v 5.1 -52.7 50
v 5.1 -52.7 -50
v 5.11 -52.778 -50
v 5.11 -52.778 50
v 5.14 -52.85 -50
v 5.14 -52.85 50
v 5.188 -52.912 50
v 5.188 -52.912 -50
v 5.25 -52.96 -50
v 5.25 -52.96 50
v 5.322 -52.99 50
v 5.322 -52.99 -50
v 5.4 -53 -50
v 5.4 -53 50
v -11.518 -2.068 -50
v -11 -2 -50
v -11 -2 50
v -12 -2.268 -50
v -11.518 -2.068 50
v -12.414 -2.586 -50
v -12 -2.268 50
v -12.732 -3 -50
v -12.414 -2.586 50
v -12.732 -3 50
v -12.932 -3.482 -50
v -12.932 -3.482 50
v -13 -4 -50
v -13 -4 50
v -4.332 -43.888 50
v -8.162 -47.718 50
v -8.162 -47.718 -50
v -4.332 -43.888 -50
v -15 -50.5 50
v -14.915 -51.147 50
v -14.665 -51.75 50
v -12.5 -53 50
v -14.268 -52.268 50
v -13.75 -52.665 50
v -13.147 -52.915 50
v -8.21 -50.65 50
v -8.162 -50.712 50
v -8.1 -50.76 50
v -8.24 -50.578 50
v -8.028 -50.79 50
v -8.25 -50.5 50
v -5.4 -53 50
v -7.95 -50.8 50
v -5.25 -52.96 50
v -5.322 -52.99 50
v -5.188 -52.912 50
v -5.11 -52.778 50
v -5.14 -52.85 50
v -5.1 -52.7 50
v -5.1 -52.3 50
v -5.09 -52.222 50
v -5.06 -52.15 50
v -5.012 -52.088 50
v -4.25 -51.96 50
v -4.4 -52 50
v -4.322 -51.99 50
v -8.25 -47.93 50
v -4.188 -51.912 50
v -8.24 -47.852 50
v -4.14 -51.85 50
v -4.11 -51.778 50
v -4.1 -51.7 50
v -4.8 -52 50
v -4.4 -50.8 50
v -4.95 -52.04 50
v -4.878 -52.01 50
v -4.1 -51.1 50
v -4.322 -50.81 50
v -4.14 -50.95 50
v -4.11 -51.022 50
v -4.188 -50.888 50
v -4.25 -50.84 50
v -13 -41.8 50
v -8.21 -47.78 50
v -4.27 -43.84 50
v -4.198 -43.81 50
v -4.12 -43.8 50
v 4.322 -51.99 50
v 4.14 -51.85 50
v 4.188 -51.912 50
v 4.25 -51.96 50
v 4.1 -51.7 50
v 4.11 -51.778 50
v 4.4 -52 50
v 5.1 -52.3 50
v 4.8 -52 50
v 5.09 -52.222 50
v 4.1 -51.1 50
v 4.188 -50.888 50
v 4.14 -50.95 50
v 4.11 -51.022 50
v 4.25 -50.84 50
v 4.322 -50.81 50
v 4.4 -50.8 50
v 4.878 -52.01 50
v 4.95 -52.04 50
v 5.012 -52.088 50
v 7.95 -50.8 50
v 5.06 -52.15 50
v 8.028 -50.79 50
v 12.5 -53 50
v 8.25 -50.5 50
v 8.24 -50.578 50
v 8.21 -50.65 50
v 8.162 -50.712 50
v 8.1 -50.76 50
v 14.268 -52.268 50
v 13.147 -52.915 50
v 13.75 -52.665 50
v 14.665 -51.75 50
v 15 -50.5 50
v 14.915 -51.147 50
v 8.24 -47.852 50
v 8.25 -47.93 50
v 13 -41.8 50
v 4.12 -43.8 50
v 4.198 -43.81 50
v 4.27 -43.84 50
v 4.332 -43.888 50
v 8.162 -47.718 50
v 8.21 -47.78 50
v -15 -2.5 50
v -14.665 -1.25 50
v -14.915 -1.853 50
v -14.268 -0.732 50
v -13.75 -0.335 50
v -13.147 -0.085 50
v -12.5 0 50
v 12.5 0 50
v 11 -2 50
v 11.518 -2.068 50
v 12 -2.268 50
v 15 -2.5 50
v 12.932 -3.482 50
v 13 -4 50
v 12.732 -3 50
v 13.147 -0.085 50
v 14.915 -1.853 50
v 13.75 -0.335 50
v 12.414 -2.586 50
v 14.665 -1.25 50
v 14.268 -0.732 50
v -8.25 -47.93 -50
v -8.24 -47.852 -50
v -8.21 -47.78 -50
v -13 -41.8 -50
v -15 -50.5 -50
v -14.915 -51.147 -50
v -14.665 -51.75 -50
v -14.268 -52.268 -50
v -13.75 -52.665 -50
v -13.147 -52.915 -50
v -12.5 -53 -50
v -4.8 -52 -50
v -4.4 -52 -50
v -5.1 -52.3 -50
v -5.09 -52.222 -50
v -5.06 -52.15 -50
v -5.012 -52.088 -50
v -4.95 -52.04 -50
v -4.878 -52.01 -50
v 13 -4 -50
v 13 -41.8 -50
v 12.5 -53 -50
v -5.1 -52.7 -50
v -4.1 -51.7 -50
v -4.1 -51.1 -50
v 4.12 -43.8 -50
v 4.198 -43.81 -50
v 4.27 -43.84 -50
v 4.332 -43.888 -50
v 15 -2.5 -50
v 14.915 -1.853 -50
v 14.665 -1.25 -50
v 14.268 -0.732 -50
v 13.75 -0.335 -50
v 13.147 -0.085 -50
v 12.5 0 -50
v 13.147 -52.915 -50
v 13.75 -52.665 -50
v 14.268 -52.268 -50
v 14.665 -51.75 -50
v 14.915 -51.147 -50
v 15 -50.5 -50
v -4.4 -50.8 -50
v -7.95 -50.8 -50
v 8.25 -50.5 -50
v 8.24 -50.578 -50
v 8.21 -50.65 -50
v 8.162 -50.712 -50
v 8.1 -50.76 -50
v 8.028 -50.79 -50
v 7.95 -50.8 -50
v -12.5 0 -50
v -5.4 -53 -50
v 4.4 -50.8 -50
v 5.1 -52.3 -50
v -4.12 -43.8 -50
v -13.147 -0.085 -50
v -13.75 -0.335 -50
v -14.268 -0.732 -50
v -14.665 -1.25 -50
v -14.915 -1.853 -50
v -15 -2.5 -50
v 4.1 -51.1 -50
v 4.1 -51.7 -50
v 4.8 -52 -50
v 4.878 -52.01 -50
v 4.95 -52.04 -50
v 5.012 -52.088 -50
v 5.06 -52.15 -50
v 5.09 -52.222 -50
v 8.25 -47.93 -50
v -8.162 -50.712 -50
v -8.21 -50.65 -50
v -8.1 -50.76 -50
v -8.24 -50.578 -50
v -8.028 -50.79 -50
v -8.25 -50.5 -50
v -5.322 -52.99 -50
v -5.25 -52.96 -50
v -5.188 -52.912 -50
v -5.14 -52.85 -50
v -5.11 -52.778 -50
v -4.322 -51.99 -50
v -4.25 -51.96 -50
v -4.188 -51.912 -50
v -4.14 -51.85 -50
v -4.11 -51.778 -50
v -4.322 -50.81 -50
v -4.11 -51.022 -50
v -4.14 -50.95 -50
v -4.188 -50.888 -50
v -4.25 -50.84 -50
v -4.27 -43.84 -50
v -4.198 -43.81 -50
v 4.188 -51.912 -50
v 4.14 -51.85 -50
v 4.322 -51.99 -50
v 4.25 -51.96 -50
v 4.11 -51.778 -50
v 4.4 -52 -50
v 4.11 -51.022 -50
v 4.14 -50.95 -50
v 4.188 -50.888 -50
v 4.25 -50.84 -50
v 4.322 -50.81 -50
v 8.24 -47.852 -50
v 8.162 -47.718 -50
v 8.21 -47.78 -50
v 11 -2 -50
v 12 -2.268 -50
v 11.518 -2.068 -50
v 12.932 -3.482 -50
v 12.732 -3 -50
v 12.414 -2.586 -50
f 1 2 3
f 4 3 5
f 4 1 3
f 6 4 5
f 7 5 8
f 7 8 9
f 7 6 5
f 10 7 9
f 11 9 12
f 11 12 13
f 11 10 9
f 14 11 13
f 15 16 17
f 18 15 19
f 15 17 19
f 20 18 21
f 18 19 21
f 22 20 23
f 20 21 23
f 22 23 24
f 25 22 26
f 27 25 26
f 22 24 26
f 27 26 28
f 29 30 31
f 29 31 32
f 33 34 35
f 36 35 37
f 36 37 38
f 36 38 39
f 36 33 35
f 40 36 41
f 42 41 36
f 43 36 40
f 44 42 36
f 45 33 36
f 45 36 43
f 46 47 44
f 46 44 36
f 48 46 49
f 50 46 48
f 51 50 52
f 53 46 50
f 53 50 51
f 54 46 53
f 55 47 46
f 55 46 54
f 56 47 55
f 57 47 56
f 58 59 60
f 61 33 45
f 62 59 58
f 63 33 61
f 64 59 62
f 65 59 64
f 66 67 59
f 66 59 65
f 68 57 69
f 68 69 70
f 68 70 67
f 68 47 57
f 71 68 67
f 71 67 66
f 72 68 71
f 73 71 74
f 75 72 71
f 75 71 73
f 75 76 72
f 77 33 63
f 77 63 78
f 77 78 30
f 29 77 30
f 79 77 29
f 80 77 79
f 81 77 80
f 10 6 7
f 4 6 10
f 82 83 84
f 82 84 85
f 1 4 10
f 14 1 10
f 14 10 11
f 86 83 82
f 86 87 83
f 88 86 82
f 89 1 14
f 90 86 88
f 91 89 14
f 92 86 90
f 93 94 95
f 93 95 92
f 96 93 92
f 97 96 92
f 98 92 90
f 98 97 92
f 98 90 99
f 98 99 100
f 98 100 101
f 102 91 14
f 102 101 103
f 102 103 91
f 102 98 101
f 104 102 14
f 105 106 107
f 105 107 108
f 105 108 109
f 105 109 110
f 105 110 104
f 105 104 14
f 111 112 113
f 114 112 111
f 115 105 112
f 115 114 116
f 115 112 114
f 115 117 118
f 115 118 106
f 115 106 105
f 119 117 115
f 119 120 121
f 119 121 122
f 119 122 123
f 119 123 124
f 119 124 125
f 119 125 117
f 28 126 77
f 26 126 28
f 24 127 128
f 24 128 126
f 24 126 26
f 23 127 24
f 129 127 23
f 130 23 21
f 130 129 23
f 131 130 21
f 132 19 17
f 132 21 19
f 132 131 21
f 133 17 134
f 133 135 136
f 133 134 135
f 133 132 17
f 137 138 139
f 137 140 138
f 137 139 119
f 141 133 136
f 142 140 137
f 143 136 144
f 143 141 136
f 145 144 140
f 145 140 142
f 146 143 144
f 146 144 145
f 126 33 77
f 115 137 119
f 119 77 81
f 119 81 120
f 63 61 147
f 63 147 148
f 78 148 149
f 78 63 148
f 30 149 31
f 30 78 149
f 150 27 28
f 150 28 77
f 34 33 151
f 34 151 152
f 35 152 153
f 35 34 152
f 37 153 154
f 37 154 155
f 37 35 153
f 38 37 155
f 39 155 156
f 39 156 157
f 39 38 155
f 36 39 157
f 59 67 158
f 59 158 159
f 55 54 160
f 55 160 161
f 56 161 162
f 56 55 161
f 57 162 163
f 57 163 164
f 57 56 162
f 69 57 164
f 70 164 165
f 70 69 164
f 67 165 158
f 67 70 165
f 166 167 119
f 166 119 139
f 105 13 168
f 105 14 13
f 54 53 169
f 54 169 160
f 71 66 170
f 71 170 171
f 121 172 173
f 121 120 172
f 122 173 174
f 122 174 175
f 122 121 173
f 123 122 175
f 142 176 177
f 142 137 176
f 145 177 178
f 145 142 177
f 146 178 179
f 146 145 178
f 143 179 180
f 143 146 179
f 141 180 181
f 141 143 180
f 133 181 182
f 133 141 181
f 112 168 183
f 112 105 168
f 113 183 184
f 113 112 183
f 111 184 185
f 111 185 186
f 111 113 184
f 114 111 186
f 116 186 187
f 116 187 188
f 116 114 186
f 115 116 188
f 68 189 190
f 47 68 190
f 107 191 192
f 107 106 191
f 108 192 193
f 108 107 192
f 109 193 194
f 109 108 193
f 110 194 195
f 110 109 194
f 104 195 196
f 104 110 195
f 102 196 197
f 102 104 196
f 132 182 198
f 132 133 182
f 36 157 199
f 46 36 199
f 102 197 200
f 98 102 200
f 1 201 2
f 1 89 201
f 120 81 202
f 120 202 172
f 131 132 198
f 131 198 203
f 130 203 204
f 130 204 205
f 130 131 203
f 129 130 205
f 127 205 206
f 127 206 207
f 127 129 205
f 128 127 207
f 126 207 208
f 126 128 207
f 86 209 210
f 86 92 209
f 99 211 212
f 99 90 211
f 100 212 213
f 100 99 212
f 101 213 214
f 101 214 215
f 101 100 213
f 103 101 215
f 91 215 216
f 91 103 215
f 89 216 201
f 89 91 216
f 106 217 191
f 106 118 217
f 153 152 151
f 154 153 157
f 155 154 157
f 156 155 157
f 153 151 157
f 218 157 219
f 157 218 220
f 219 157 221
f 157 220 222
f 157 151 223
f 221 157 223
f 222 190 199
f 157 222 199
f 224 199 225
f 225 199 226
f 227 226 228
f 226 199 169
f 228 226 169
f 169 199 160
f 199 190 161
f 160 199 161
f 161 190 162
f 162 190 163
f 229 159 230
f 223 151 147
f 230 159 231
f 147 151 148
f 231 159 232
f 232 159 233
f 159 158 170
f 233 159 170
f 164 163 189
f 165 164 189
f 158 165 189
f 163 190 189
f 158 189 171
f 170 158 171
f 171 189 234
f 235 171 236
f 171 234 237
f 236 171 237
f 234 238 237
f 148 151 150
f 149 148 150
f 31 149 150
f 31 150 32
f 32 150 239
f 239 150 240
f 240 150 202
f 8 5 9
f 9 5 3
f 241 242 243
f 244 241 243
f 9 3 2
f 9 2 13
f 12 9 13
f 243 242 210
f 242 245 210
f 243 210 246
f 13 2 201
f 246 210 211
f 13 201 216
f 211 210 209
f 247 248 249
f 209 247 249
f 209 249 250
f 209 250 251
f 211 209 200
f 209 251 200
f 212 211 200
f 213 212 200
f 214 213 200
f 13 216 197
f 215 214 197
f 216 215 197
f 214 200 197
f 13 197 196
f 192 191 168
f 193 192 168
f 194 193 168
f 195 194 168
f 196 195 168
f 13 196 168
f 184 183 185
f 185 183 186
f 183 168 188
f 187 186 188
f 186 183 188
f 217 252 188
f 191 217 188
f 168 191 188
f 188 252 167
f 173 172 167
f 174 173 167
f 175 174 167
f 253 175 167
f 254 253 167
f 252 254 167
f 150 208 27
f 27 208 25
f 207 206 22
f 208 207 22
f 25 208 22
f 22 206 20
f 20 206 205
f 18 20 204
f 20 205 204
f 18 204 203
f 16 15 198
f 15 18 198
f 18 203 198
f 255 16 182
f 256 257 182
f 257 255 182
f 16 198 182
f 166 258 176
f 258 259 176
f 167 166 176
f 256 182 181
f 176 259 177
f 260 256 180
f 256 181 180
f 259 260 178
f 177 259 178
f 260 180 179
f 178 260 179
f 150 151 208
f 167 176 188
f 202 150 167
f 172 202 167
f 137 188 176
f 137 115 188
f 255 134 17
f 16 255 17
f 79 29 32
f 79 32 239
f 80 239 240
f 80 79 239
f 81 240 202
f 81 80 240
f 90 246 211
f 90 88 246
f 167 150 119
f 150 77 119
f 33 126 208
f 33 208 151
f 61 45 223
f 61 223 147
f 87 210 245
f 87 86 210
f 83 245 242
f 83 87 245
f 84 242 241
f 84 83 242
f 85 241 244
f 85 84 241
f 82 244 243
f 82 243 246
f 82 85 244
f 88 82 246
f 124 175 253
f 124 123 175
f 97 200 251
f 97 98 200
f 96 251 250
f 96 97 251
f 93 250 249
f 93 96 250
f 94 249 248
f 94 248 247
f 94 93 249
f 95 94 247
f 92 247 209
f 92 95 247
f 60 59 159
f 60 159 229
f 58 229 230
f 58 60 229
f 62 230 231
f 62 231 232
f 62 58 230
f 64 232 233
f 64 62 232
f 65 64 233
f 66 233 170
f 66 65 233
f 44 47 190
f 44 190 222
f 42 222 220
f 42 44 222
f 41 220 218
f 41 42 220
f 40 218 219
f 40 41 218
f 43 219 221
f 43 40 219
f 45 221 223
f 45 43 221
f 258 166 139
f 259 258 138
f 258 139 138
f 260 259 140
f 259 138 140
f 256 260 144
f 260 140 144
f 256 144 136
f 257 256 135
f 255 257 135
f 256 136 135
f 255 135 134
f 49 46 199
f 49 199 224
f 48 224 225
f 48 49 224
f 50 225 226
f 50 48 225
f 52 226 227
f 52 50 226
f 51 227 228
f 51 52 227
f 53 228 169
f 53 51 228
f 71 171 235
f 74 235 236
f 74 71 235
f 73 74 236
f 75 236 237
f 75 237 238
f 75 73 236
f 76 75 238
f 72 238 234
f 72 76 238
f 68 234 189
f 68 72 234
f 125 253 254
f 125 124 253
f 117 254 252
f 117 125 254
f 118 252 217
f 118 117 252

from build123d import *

# Parameters (mm, degrees)
EXTRUDE_1_DEPTH = 50


with BuildPart() as part:
    # 草图1 → 凸台-拉伸1 (new, symmetric)
    with BuildSketch(Plane.XY):
        with BuildLine():
            Line((12.49999999, 0), (-12.49999999, 0))
            ThreePointArc((-12.49999999, 0), (-14.267766942, -0.732233047), (-14.999999989, -2.499999998))
            Line((-14.999999989, -2.499999998), (-14.999999989, -50.500000002))
            ThreePointArc((-14.999999989, -50.500000002), (-14.267766942, -52.267766953), (-12.49999999, -53))
            Line((-12.49999999, -53), (-5.399999995, -53))
            ThreePointArc((-5.399999995, -53), (-5.187867961, -52.912132034), (-5.099999996, -52.7))
            Line((-5.099999996, -52.7), (-5.099999996, -52.300000001))
            ThreePointArc((-5.099999996, -52.300000001), (-5.01213203, -52.087867966), (-4.799999996, -52.000000001))
            Line((-4.799999996, -52.000000001), (-4.399999997, -52.000000001))
            ThreePointArc((-4.399999997, -52.000000001), (-4.187867962, -51.912132035), (-4.099999997, -51.700000001))
            Line((-4.099999997, -51.700000001), (-4.099999997, -51.100000001))
            ThreePointArc((-4.099999997, -51.100000001), (-4.187867962, -50.887867967), (-4.399999997, -50.800000002))
            Line((-4.399999997, -50.800000002), (-7.949999994, -50.800000002))
            ThreePointArc((-7.949999994, -50.800000002), (-8.162132028, -50.712132036), (-8.249999994, -50.500000002))
            Line((-8.249999994, -50.500000002), (-8.249999994, -47.929898991))
            ThreePointArc((-8.249999994, -47.929898991), (-8.227163853, -47.815093962), (-8.162132028, -47.717766957))
            Line((-8.162132028, -47.717766957), (-4.332233044, -43.887867973))
            ThreePointArc((-4.332233044, -43.887867973), (-4.234906039, -43.822836147), (-4.12010101, -43.800000007))
            Line((-4.12010101, -43.800000007), (4.12010101, -43.800000007))
            ThreePointArc((4.12010101, -43.800000007), (4.234906039, -43.822836147), (4.332233044, -43.887867973))
            Line((4.332233044, -43.887867973), (8.162132028, -47.717766957))
            ThreePointArc((8.162132028, -47.717766957), (8.227163854, -47.815093961), (8.249999994, -47.929898991))
            Line((8.249999994, -47.929898991), (8.249999994, -50.500000002))
            ThreePointArc((8.249999994, -50.500000002), (8.162132028, -50.712132036), (7.949999994, -50.800000002))
            Line((7.949999994, -50.800000002), (4.399999997, -50.800000002))
            ThreePointArc((4.399999997, -50.800000002), (4.187867963, -50.887867967), (4.099999997, -51.100000001))
            Line((4.099999997, -51.100000001), (4.099999997, -51.700000001))
            ThreePointArc((4.099999997, -51.700000001), (4.187867963, -51.912132035), (4.399999997, -52.000000001))
            Line((4.399999997, -52.000000001), (4.799999996, -52.000000001))
            ThreePointArc((4.799999996, -52.000000001), (5.01213203, -52.087867966), (5.099999996, -52.300000001))
            Line((5.099999996, -52.300000001), (5.099999996, -52.7))
            ThreePointArc((5.099999996, -52.7), (5.187867962, -52.912132034), (5.399999996, -53))
            Line((5.399999996, -53), (12.49999999, -53))
            ThreePointArc((12.49999999, -53), (14.267766942, -52.267766953), (14.999999989, -50.500000002))
            Line((14.999999989, -50.500000002), (14.999999989, -2.499999998))
            ThreePointArc((14.999999989, -2.499999998), (14.267766942, -0.732233047), (12.49999999, 0))
        make_face()
        with BuildLine():
            Line((10.999999989, -2), (-10.999999989, -2))
            ThreePointArc((-10.999999989, -2), (-12.414213551, -2.585786438), (-12.999999989, -4))
            Line((-12.999999989, -4), (-12.999999989, -41.800000007))
            Line((-12.999999989, -41.800000007), (12.999999989, -41.800000007))
            Line((12.999999989, -41.800000007), (12.999999989, -4))
            ThreePointArc((12.999999989, -4), (12.414213551, -2.585786438), (10.999999989, -2))
        make_face(mode=Mode.SUBTRACT)
    extrude(amount=EXTRUDE_1_DEPTH, both=True)


solid = part.part
